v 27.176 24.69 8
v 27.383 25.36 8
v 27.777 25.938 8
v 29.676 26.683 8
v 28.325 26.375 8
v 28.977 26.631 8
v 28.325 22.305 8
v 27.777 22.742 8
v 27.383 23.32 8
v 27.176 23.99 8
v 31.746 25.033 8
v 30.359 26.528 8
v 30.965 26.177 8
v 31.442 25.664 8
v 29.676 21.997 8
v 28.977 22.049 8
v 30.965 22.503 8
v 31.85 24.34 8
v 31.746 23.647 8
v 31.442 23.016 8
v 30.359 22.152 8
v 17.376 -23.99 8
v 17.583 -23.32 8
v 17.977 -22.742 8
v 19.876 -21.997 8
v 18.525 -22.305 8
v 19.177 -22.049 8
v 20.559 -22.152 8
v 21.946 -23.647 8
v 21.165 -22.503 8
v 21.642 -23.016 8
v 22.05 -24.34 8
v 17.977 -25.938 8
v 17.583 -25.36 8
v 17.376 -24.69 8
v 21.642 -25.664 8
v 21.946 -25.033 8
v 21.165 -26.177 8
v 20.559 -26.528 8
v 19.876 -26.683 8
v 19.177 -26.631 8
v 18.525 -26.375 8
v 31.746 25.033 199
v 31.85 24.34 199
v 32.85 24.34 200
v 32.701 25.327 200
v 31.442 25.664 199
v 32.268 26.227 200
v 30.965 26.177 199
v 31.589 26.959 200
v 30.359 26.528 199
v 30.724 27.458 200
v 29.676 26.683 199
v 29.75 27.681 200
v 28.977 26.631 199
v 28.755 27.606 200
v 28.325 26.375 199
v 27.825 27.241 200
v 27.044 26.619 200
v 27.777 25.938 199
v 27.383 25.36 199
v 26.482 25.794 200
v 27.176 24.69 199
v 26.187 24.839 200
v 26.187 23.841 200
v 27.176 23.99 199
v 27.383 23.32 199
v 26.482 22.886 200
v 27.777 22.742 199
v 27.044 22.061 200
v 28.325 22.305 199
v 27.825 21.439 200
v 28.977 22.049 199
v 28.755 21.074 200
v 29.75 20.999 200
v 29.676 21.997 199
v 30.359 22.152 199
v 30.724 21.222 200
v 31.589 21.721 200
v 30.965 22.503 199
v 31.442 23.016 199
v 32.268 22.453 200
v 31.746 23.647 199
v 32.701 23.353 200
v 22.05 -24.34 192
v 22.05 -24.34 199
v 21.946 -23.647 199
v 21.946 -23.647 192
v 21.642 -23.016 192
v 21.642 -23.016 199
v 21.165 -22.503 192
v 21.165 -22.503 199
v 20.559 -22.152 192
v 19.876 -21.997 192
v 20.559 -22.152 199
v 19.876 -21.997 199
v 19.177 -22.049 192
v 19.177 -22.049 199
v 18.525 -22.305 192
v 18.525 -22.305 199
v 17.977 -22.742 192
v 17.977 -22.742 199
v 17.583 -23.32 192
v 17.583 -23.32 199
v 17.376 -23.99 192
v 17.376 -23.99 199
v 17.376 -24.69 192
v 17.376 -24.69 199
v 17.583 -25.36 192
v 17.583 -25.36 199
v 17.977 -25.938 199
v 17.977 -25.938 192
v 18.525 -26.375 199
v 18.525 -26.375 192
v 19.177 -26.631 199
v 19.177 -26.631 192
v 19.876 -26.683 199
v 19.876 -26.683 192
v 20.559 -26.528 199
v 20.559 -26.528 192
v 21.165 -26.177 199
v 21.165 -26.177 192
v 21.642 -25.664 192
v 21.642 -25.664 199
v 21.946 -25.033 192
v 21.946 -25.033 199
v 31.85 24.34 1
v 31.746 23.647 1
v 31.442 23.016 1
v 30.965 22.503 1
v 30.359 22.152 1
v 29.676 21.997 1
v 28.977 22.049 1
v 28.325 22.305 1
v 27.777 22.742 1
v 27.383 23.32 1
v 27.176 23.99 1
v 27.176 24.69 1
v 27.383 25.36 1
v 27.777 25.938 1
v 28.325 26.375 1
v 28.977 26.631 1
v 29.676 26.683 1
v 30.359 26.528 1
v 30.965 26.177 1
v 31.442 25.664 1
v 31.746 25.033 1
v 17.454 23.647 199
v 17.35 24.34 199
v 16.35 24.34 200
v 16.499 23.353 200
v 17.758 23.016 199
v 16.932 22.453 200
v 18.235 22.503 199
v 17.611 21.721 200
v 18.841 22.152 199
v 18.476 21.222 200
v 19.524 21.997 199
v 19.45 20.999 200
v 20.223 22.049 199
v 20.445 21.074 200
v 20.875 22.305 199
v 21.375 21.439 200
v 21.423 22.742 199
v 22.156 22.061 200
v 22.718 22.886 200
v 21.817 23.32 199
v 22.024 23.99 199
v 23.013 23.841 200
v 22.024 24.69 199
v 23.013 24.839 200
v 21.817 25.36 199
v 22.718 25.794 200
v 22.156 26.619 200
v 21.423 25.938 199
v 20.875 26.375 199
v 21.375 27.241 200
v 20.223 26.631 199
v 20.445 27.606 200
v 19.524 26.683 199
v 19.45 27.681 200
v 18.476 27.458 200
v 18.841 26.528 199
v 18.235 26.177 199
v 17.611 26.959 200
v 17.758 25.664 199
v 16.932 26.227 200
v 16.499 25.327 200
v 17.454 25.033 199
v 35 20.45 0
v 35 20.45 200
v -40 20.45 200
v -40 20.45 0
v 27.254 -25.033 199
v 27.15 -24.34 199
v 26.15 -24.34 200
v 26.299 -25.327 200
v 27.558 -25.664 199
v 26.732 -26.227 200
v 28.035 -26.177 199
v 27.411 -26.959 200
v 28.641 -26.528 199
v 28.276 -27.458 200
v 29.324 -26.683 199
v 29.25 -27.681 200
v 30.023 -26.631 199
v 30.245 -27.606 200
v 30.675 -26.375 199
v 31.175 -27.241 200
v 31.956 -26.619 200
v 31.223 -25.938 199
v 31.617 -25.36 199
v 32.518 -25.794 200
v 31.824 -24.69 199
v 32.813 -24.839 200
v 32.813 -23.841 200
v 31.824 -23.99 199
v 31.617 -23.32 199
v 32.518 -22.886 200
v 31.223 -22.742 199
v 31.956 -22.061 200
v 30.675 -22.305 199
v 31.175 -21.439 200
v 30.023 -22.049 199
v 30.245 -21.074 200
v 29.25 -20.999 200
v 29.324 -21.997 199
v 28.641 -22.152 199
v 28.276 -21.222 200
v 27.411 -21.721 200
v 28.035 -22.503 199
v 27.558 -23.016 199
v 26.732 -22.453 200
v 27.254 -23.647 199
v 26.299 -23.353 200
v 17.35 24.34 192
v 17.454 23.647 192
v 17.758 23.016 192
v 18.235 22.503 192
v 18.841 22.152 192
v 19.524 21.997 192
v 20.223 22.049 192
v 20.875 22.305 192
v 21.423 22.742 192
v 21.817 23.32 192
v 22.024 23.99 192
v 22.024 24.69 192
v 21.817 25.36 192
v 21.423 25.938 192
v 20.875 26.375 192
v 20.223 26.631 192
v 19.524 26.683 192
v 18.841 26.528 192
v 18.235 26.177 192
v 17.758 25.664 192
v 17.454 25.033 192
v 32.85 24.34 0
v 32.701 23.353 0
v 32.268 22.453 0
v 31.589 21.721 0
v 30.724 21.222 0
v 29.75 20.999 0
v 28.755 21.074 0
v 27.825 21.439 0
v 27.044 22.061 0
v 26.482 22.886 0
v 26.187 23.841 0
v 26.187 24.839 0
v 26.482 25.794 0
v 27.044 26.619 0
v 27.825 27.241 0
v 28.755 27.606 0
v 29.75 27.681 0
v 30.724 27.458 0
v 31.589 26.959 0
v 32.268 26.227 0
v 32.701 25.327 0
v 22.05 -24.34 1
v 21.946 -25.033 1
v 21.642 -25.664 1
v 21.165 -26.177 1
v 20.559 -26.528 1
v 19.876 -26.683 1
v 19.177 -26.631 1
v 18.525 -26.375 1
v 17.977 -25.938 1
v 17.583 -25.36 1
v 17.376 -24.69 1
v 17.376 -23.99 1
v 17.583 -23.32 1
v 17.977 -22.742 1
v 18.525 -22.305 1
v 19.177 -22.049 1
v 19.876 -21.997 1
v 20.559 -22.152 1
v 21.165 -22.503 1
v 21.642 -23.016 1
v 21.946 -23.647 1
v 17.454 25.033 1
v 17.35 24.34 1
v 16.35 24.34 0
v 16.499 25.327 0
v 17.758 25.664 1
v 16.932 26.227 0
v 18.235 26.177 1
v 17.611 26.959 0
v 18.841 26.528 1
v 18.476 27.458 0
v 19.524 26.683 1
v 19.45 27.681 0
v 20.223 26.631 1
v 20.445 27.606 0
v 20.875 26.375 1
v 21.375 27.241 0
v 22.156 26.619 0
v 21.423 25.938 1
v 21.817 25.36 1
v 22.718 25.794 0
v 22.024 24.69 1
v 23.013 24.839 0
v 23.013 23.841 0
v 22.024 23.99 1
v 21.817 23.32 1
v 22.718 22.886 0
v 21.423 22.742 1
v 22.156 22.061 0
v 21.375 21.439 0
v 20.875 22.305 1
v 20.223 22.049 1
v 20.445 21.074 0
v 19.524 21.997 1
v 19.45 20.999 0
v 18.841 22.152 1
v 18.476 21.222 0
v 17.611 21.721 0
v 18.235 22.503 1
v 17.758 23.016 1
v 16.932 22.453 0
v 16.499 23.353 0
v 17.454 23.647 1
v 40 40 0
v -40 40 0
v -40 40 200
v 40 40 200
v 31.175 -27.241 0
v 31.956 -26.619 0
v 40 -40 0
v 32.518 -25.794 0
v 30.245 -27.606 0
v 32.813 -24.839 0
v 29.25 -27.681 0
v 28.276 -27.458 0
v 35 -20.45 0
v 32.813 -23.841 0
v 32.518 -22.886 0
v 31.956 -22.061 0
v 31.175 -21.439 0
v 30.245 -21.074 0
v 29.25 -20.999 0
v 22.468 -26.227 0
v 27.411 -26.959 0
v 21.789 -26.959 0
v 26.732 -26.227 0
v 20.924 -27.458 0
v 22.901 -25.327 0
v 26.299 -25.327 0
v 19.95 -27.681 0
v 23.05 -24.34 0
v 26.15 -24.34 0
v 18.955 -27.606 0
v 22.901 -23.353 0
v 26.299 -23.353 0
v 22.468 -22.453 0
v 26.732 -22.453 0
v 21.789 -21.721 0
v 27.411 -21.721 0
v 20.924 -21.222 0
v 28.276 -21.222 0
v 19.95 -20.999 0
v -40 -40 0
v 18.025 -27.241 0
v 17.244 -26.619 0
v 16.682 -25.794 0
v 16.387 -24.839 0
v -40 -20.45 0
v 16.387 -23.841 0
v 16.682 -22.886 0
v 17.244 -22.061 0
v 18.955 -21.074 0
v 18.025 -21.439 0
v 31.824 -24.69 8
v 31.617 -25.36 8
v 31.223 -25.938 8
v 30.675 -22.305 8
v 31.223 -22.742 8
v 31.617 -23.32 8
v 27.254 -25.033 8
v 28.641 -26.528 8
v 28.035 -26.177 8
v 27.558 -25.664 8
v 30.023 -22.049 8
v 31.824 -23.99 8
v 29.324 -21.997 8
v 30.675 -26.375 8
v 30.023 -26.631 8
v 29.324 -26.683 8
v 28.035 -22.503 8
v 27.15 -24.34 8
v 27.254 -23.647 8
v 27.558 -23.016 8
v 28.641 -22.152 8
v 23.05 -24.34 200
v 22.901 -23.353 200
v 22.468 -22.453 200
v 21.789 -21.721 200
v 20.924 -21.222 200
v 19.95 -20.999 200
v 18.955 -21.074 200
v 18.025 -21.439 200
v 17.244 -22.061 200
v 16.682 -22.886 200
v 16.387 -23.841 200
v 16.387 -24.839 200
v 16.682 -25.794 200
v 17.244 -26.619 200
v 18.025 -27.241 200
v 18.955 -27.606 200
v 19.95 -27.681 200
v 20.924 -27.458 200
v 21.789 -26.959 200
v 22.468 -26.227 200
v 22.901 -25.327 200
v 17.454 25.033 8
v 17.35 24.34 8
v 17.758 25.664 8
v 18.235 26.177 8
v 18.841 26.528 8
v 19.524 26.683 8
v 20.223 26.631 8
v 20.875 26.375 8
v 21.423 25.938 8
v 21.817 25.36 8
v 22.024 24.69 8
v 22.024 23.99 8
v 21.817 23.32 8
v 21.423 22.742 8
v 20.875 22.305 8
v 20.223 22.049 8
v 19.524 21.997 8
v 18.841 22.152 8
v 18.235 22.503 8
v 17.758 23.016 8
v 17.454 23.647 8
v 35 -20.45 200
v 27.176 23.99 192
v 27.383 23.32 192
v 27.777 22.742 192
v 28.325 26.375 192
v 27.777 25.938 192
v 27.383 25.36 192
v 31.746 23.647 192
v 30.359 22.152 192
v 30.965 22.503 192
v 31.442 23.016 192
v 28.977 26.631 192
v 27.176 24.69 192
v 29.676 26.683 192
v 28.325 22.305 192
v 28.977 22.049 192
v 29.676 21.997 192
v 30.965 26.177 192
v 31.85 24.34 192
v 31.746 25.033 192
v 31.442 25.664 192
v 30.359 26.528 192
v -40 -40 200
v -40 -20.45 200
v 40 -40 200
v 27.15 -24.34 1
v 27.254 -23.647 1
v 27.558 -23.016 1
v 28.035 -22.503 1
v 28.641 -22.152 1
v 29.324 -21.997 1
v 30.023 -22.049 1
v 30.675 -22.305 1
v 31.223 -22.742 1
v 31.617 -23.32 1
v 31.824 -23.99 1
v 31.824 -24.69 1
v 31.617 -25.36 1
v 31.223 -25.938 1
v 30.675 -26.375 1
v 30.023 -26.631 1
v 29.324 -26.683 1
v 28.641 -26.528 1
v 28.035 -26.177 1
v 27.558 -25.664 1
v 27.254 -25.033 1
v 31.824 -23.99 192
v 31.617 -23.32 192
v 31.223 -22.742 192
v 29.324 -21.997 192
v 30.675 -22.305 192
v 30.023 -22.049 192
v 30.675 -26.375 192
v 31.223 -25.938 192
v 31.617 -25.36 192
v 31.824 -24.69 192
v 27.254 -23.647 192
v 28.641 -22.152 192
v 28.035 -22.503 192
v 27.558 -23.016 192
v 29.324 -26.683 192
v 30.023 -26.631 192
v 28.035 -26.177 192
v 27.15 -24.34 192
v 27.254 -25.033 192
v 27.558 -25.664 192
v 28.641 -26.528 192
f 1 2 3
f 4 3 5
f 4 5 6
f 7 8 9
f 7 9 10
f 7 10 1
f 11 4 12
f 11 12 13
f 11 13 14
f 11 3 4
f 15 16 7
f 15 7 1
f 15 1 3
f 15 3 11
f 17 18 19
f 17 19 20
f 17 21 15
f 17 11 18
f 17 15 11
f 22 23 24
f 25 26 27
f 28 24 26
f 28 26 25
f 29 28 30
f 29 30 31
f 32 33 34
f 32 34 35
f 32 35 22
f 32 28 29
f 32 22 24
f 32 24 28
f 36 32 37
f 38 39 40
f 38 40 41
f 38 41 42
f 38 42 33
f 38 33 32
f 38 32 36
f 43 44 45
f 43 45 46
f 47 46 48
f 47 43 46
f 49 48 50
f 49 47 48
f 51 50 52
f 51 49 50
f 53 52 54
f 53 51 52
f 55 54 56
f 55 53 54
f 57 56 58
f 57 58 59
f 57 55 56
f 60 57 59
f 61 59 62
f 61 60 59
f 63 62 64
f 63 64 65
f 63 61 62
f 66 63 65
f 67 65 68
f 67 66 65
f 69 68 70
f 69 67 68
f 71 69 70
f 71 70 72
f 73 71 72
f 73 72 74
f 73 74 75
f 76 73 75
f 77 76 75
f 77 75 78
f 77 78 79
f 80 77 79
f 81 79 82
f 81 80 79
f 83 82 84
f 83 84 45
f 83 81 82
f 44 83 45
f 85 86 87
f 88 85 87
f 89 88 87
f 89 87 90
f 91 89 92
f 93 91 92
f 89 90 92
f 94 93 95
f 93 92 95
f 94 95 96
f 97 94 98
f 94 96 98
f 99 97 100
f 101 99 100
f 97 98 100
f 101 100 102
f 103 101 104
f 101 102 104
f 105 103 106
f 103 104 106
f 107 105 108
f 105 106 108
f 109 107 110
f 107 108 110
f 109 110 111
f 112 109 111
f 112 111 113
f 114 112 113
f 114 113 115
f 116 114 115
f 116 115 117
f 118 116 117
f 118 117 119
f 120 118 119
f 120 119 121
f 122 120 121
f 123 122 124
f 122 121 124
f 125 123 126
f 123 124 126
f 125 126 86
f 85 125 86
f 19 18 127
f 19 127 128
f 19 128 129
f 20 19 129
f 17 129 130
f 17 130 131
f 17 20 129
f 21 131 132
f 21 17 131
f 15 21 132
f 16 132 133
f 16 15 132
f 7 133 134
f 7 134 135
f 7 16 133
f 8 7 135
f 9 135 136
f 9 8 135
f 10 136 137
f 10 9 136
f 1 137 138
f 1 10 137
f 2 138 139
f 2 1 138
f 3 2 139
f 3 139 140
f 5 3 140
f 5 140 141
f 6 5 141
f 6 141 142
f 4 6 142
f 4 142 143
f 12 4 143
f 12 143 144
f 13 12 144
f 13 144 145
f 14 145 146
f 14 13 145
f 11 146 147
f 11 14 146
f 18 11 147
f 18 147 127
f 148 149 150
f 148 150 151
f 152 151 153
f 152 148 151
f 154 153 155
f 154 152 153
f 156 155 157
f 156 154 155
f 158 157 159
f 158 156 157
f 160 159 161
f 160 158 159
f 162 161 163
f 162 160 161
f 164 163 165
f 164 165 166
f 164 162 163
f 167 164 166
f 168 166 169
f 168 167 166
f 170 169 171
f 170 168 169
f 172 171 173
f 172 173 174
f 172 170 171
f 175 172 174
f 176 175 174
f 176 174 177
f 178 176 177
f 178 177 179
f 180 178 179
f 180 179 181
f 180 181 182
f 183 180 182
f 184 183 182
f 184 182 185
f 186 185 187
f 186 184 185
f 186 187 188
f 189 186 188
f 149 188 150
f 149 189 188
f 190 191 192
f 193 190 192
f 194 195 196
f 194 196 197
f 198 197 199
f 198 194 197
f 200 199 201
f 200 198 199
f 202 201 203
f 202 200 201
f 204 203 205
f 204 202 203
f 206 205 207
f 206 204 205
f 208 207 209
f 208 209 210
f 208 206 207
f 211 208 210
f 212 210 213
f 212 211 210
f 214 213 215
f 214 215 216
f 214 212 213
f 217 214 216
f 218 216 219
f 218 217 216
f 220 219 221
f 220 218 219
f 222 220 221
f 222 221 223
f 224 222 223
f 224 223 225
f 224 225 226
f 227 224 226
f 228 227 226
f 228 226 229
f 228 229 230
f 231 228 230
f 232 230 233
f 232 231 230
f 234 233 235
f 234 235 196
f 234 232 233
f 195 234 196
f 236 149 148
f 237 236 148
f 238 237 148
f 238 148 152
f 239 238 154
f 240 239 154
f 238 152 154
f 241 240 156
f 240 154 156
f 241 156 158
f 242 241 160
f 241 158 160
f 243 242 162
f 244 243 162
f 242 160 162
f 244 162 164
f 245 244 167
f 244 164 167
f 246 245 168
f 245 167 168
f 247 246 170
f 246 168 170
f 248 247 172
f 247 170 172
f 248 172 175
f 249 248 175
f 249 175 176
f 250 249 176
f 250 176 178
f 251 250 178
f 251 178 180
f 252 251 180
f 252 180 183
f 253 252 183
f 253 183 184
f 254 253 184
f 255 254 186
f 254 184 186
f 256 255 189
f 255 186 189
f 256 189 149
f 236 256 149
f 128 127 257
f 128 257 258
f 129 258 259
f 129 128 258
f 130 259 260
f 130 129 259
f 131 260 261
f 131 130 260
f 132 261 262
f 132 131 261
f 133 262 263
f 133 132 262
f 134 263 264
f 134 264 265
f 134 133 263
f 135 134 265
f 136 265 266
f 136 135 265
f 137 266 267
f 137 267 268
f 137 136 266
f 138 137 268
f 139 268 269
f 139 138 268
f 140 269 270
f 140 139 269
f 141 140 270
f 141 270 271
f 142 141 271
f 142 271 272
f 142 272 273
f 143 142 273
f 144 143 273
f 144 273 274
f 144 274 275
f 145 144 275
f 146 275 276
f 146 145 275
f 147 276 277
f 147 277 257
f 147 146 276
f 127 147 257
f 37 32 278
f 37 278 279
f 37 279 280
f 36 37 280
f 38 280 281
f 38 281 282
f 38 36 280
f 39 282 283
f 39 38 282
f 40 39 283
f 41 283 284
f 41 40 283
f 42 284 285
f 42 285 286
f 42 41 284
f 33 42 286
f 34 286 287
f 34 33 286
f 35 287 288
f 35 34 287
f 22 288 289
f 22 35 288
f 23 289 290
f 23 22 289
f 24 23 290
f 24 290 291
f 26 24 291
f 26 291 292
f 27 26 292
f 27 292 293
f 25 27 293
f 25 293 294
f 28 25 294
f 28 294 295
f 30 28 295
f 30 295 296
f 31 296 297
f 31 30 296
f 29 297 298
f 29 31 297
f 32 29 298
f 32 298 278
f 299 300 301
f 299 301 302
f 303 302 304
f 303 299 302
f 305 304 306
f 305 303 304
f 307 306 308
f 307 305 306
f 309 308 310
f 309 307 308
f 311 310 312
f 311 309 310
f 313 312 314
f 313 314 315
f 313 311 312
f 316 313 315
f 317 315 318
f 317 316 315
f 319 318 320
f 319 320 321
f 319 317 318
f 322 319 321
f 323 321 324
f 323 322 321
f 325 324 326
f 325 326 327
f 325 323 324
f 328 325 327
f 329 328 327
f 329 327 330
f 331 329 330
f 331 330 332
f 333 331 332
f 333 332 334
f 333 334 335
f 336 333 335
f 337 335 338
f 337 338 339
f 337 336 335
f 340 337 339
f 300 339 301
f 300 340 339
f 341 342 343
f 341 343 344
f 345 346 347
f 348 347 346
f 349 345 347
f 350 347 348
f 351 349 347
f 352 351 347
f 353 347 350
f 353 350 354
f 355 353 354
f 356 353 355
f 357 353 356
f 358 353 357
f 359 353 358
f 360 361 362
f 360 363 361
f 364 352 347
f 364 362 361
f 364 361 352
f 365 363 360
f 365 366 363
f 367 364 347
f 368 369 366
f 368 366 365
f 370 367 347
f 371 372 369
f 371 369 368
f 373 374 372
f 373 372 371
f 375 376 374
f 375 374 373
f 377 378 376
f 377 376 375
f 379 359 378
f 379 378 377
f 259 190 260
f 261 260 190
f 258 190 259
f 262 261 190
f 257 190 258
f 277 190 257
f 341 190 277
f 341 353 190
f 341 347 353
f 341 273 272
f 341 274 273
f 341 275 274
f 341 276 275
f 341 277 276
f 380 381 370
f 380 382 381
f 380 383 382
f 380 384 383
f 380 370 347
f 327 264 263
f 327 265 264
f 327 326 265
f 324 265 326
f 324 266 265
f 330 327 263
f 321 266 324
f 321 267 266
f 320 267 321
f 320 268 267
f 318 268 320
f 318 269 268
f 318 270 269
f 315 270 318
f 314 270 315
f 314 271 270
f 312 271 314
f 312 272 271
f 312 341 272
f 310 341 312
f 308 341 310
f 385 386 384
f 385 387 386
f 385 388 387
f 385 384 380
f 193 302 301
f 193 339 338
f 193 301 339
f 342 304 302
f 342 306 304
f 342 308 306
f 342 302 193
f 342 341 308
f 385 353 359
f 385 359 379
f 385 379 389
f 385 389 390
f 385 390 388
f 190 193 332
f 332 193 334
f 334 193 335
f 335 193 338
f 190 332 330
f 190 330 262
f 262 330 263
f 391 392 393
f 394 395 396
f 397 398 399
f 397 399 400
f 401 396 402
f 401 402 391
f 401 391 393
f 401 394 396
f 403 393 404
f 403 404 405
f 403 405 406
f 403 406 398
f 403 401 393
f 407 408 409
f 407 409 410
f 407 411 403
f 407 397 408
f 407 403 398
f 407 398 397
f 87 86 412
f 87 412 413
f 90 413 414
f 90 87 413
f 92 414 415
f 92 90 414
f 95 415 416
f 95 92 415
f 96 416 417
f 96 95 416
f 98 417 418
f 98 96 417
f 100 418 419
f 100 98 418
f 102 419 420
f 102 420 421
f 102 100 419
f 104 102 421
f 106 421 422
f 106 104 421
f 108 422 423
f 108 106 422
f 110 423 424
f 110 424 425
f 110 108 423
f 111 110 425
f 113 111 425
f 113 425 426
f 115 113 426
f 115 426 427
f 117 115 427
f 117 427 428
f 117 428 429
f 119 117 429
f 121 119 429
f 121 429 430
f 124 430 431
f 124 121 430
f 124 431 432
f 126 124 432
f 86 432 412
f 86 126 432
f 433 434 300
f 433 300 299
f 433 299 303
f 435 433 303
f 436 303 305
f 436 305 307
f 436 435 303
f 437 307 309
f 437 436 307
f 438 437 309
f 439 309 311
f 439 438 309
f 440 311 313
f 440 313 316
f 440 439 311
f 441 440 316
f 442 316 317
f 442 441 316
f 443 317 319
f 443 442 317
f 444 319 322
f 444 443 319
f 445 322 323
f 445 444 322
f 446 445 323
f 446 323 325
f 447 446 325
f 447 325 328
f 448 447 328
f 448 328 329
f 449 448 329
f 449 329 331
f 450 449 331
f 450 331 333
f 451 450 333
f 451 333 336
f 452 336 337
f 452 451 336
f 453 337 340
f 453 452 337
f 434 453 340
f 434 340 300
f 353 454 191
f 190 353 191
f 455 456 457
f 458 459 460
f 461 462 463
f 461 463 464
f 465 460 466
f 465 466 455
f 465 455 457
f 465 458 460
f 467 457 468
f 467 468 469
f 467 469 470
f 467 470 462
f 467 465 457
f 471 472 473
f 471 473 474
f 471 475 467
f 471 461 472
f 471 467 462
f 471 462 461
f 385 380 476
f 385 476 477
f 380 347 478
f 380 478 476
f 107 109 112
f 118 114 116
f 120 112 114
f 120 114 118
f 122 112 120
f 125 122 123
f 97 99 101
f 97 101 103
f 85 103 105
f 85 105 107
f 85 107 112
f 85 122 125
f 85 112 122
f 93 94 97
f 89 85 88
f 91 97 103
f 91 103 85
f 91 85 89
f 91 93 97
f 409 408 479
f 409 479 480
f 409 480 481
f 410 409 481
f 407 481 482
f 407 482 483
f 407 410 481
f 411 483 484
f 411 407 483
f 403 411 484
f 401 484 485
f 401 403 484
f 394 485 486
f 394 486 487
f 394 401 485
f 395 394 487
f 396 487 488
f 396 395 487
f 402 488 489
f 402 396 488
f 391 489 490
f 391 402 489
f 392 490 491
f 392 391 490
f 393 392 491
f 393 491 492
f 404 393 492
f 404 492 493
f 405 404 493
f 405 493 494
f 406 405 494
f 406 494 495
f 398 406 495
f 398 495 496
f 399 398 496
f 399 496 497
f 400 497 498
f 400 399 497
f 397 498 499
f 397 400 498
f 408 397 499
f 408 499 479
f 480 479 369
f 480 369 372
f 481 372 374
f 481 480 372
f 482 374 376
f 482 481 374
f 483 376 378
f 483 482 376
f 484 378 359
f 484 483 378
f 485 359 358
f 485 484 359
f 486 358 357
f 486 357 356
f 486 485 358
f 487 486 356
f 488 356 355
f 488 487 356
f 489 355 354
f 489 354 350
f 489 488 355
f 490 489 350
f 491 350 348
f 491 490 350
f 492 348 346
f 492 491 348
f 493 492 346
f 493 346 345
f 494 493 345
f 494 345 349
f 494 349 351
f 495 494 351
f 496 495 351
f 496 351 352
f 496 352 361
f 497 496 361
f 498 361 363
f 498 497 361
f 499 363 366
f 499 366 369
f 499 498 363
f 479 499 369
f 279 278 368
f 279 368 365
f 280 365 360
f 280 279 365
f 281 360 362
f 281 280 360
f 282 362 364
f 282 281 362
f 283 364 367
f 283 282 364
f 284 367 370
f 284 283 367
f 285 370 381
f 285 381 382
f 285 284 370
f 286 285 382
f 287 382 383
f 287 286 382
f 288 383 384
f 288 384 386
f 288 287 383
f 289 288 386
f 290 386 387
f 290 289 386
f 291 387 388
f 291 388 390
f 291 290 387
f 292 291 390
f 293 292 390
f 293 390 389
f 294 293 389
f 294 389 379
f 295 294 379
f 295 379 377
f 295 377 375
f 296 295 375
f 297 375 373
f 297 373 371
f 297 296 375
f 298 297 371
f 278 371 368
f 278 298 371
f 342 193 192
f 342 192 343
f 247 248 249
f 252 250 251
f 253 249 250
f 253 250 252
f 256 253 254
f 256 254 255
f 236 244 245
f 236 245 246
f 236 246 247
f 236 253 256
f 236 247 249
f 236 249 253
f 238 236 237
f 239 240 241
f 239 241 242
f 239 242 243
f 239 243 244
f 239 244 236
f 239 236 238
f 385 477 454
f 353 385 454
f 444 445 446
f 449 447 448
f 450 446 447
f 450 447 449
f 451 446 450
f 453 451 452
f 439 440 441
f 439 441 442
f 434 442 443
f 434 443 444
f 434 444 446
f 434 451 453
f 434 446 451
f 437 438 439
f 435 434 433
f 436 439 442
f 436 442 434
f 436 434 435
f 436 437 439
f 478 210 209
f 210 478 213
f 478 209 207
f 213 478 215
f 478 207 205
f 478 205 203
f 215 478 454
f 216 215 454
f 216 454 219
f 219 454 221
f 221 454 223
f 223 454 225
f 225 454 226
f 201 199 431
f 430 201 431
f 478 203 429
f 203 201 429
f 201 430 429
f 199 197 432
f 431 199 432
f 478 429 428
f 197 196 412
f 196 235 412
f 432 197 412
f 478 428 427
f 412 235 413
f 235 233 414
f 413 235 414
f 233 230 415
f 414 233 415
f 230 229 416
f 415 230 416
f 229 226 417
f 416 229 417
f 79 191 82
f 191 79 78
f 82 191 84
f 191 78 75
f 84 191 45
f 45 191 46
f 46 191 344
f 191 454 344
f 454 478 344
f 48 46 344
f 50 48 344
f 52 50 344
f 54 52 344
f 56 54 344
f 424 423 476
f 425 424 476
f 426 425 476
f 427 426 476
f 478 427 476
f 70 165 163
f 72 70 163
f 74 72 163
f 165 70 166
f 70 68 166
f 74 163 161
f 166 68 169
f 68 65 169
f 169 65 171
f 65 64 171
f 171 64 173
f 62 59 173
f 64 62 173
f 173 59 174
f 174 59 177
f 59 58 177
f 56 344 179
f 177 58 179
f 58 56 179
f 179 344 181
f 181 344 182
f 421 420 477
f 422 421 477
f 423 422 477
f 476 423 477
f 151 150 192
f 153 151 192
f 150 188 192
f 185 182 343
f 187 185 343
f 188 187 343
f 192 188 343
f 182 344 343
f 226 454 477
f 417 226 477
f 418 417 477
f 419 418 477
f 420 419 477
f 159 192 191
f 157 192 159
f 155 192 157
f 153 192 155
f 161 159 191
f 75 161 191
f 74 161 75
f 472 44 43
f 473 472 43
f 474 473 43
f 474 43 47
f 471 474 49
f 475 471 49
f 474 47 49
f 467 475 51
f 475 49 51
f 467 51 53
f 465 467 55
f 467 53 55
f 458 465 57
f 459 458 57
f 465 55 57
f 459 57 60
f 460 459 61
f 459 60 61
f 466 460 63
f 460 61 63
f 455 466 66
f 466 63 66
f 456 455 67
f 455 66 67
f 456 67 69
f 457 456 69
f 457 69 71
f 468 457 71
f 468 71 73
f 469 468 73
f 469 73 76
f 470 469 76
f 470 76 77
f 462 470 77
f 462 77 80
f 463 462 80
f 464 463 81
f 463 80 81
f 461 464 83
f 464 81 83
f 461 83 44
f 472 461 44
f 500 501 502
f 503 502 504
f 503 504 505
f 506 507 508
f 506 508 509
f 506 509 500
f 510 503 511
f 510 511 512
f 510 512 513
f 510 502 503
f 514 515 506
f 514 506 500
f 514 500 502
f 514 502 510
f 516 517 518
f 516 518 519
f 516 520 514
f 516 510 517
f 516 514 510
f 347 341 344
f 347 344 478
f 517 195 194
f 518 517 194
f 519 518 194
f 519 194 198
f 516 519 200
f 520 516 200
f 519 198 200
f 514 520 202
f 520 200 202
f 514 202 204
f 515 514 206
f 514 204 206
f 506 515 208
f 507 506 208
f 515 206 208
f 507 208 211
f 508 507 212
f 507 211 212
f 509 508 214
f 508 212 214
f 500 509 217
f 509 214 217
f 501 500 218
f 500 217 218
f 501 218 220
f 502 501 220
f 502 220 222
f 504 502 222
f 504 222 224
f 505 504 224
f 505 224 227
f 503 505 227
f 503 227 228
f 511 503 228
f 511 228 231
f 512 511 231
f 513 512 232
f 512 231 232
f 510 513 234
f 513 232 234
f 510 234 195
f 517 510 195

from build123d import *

# Parameters (mm, degrees)
BOSS_EXTRUDE1_DEPTH = 200
SKETCH2_R           = 2.35
CUT_EXTRUDE1_DEPTH  = 8
CUT_EXTRUDE2_START  = -8
SKETCH3_R           = 2.35
CUT_EXTRUDE2_DEPTH  = 8
CHAMFER1_SIZE       = 1


with BuildPart() as part:
    # Sketch1 → Boss-Extrude1 (new body)
    with BuildSketch(Plane.XY):
        Polygon((-40, 40), (40, 40), (40, -40), (-40, -40), (-40, -20.45), (35, -20.45), (35, 20.45), (-40, 20.45), align=None)
    extrude(amount=BOSS_EXTRUDE1_DEPTH)

    # Sketch2 → Cut-Extrude1 (cut)
    with BuildSketch(Plane.XY.offset(200)):
        with Locations((29.5, 24.34)):
            Circle(SKETCH2_R)
        with Locations(Location((19.7, 24.34, 0), (0, 0, 180))):
            Circle(SKETCH2_R)
        with Locations((19.7, -24.34)):
            Circle(SKETCH2_R)
        with Locations(Location((29.5, -24.34, 0), (0, 0, 180))):
            Circle(SKETCH2_R)
    extrude(amount=-CUT_EXTRUDE1_DEPTH, mode=Mode.SUBTRACT)

    # Sketch3 → Cut-Extrude2 (cut)
    with BuildSketch(Plane(origin=(0, 0, 0), x_dir=(-1, 0, 0), z_dir=(0, 0, -1)).offset(CUT_EXTRUDE2_START)):
        with Locations(Location((-29.5, 24.34, 0), (0, 0, 180))):
            Circle(SKETCH3_R)
        with Locations((-19.7, 24.34)):
            Circle(SKETCH3_R)
        with Locations(Location((-19.7, -24.34, 0), (0, 0, 180))):
            Circle(SKETCH3_R)
        with Locations((-29.5, -24.34)):
            Circle(SKETCH3_R)
    extrude(amount=CUT_EXTRUDE2_DEPTH, mode=Mode.SUBTRACT)

    # Chamfer1
    chamfer1_edges = [part.edges().sort_by_distance(p)[0] for p in [
        (31.85, -24.34, 200),
        (17.35, -24.34, 200),
        (22.05, 24.34, 200),
        (27.15, 24.34, 200),
        (31.85, -24.34, 0),
        (17.35, -24.34, 0),
        (22.05, 24.34, 0),
        (27.15, 24.34, 0),
    ]]
    chamfer(chamfer1_edges, length=CHAMFER1_SIZE)


solid = part.part
